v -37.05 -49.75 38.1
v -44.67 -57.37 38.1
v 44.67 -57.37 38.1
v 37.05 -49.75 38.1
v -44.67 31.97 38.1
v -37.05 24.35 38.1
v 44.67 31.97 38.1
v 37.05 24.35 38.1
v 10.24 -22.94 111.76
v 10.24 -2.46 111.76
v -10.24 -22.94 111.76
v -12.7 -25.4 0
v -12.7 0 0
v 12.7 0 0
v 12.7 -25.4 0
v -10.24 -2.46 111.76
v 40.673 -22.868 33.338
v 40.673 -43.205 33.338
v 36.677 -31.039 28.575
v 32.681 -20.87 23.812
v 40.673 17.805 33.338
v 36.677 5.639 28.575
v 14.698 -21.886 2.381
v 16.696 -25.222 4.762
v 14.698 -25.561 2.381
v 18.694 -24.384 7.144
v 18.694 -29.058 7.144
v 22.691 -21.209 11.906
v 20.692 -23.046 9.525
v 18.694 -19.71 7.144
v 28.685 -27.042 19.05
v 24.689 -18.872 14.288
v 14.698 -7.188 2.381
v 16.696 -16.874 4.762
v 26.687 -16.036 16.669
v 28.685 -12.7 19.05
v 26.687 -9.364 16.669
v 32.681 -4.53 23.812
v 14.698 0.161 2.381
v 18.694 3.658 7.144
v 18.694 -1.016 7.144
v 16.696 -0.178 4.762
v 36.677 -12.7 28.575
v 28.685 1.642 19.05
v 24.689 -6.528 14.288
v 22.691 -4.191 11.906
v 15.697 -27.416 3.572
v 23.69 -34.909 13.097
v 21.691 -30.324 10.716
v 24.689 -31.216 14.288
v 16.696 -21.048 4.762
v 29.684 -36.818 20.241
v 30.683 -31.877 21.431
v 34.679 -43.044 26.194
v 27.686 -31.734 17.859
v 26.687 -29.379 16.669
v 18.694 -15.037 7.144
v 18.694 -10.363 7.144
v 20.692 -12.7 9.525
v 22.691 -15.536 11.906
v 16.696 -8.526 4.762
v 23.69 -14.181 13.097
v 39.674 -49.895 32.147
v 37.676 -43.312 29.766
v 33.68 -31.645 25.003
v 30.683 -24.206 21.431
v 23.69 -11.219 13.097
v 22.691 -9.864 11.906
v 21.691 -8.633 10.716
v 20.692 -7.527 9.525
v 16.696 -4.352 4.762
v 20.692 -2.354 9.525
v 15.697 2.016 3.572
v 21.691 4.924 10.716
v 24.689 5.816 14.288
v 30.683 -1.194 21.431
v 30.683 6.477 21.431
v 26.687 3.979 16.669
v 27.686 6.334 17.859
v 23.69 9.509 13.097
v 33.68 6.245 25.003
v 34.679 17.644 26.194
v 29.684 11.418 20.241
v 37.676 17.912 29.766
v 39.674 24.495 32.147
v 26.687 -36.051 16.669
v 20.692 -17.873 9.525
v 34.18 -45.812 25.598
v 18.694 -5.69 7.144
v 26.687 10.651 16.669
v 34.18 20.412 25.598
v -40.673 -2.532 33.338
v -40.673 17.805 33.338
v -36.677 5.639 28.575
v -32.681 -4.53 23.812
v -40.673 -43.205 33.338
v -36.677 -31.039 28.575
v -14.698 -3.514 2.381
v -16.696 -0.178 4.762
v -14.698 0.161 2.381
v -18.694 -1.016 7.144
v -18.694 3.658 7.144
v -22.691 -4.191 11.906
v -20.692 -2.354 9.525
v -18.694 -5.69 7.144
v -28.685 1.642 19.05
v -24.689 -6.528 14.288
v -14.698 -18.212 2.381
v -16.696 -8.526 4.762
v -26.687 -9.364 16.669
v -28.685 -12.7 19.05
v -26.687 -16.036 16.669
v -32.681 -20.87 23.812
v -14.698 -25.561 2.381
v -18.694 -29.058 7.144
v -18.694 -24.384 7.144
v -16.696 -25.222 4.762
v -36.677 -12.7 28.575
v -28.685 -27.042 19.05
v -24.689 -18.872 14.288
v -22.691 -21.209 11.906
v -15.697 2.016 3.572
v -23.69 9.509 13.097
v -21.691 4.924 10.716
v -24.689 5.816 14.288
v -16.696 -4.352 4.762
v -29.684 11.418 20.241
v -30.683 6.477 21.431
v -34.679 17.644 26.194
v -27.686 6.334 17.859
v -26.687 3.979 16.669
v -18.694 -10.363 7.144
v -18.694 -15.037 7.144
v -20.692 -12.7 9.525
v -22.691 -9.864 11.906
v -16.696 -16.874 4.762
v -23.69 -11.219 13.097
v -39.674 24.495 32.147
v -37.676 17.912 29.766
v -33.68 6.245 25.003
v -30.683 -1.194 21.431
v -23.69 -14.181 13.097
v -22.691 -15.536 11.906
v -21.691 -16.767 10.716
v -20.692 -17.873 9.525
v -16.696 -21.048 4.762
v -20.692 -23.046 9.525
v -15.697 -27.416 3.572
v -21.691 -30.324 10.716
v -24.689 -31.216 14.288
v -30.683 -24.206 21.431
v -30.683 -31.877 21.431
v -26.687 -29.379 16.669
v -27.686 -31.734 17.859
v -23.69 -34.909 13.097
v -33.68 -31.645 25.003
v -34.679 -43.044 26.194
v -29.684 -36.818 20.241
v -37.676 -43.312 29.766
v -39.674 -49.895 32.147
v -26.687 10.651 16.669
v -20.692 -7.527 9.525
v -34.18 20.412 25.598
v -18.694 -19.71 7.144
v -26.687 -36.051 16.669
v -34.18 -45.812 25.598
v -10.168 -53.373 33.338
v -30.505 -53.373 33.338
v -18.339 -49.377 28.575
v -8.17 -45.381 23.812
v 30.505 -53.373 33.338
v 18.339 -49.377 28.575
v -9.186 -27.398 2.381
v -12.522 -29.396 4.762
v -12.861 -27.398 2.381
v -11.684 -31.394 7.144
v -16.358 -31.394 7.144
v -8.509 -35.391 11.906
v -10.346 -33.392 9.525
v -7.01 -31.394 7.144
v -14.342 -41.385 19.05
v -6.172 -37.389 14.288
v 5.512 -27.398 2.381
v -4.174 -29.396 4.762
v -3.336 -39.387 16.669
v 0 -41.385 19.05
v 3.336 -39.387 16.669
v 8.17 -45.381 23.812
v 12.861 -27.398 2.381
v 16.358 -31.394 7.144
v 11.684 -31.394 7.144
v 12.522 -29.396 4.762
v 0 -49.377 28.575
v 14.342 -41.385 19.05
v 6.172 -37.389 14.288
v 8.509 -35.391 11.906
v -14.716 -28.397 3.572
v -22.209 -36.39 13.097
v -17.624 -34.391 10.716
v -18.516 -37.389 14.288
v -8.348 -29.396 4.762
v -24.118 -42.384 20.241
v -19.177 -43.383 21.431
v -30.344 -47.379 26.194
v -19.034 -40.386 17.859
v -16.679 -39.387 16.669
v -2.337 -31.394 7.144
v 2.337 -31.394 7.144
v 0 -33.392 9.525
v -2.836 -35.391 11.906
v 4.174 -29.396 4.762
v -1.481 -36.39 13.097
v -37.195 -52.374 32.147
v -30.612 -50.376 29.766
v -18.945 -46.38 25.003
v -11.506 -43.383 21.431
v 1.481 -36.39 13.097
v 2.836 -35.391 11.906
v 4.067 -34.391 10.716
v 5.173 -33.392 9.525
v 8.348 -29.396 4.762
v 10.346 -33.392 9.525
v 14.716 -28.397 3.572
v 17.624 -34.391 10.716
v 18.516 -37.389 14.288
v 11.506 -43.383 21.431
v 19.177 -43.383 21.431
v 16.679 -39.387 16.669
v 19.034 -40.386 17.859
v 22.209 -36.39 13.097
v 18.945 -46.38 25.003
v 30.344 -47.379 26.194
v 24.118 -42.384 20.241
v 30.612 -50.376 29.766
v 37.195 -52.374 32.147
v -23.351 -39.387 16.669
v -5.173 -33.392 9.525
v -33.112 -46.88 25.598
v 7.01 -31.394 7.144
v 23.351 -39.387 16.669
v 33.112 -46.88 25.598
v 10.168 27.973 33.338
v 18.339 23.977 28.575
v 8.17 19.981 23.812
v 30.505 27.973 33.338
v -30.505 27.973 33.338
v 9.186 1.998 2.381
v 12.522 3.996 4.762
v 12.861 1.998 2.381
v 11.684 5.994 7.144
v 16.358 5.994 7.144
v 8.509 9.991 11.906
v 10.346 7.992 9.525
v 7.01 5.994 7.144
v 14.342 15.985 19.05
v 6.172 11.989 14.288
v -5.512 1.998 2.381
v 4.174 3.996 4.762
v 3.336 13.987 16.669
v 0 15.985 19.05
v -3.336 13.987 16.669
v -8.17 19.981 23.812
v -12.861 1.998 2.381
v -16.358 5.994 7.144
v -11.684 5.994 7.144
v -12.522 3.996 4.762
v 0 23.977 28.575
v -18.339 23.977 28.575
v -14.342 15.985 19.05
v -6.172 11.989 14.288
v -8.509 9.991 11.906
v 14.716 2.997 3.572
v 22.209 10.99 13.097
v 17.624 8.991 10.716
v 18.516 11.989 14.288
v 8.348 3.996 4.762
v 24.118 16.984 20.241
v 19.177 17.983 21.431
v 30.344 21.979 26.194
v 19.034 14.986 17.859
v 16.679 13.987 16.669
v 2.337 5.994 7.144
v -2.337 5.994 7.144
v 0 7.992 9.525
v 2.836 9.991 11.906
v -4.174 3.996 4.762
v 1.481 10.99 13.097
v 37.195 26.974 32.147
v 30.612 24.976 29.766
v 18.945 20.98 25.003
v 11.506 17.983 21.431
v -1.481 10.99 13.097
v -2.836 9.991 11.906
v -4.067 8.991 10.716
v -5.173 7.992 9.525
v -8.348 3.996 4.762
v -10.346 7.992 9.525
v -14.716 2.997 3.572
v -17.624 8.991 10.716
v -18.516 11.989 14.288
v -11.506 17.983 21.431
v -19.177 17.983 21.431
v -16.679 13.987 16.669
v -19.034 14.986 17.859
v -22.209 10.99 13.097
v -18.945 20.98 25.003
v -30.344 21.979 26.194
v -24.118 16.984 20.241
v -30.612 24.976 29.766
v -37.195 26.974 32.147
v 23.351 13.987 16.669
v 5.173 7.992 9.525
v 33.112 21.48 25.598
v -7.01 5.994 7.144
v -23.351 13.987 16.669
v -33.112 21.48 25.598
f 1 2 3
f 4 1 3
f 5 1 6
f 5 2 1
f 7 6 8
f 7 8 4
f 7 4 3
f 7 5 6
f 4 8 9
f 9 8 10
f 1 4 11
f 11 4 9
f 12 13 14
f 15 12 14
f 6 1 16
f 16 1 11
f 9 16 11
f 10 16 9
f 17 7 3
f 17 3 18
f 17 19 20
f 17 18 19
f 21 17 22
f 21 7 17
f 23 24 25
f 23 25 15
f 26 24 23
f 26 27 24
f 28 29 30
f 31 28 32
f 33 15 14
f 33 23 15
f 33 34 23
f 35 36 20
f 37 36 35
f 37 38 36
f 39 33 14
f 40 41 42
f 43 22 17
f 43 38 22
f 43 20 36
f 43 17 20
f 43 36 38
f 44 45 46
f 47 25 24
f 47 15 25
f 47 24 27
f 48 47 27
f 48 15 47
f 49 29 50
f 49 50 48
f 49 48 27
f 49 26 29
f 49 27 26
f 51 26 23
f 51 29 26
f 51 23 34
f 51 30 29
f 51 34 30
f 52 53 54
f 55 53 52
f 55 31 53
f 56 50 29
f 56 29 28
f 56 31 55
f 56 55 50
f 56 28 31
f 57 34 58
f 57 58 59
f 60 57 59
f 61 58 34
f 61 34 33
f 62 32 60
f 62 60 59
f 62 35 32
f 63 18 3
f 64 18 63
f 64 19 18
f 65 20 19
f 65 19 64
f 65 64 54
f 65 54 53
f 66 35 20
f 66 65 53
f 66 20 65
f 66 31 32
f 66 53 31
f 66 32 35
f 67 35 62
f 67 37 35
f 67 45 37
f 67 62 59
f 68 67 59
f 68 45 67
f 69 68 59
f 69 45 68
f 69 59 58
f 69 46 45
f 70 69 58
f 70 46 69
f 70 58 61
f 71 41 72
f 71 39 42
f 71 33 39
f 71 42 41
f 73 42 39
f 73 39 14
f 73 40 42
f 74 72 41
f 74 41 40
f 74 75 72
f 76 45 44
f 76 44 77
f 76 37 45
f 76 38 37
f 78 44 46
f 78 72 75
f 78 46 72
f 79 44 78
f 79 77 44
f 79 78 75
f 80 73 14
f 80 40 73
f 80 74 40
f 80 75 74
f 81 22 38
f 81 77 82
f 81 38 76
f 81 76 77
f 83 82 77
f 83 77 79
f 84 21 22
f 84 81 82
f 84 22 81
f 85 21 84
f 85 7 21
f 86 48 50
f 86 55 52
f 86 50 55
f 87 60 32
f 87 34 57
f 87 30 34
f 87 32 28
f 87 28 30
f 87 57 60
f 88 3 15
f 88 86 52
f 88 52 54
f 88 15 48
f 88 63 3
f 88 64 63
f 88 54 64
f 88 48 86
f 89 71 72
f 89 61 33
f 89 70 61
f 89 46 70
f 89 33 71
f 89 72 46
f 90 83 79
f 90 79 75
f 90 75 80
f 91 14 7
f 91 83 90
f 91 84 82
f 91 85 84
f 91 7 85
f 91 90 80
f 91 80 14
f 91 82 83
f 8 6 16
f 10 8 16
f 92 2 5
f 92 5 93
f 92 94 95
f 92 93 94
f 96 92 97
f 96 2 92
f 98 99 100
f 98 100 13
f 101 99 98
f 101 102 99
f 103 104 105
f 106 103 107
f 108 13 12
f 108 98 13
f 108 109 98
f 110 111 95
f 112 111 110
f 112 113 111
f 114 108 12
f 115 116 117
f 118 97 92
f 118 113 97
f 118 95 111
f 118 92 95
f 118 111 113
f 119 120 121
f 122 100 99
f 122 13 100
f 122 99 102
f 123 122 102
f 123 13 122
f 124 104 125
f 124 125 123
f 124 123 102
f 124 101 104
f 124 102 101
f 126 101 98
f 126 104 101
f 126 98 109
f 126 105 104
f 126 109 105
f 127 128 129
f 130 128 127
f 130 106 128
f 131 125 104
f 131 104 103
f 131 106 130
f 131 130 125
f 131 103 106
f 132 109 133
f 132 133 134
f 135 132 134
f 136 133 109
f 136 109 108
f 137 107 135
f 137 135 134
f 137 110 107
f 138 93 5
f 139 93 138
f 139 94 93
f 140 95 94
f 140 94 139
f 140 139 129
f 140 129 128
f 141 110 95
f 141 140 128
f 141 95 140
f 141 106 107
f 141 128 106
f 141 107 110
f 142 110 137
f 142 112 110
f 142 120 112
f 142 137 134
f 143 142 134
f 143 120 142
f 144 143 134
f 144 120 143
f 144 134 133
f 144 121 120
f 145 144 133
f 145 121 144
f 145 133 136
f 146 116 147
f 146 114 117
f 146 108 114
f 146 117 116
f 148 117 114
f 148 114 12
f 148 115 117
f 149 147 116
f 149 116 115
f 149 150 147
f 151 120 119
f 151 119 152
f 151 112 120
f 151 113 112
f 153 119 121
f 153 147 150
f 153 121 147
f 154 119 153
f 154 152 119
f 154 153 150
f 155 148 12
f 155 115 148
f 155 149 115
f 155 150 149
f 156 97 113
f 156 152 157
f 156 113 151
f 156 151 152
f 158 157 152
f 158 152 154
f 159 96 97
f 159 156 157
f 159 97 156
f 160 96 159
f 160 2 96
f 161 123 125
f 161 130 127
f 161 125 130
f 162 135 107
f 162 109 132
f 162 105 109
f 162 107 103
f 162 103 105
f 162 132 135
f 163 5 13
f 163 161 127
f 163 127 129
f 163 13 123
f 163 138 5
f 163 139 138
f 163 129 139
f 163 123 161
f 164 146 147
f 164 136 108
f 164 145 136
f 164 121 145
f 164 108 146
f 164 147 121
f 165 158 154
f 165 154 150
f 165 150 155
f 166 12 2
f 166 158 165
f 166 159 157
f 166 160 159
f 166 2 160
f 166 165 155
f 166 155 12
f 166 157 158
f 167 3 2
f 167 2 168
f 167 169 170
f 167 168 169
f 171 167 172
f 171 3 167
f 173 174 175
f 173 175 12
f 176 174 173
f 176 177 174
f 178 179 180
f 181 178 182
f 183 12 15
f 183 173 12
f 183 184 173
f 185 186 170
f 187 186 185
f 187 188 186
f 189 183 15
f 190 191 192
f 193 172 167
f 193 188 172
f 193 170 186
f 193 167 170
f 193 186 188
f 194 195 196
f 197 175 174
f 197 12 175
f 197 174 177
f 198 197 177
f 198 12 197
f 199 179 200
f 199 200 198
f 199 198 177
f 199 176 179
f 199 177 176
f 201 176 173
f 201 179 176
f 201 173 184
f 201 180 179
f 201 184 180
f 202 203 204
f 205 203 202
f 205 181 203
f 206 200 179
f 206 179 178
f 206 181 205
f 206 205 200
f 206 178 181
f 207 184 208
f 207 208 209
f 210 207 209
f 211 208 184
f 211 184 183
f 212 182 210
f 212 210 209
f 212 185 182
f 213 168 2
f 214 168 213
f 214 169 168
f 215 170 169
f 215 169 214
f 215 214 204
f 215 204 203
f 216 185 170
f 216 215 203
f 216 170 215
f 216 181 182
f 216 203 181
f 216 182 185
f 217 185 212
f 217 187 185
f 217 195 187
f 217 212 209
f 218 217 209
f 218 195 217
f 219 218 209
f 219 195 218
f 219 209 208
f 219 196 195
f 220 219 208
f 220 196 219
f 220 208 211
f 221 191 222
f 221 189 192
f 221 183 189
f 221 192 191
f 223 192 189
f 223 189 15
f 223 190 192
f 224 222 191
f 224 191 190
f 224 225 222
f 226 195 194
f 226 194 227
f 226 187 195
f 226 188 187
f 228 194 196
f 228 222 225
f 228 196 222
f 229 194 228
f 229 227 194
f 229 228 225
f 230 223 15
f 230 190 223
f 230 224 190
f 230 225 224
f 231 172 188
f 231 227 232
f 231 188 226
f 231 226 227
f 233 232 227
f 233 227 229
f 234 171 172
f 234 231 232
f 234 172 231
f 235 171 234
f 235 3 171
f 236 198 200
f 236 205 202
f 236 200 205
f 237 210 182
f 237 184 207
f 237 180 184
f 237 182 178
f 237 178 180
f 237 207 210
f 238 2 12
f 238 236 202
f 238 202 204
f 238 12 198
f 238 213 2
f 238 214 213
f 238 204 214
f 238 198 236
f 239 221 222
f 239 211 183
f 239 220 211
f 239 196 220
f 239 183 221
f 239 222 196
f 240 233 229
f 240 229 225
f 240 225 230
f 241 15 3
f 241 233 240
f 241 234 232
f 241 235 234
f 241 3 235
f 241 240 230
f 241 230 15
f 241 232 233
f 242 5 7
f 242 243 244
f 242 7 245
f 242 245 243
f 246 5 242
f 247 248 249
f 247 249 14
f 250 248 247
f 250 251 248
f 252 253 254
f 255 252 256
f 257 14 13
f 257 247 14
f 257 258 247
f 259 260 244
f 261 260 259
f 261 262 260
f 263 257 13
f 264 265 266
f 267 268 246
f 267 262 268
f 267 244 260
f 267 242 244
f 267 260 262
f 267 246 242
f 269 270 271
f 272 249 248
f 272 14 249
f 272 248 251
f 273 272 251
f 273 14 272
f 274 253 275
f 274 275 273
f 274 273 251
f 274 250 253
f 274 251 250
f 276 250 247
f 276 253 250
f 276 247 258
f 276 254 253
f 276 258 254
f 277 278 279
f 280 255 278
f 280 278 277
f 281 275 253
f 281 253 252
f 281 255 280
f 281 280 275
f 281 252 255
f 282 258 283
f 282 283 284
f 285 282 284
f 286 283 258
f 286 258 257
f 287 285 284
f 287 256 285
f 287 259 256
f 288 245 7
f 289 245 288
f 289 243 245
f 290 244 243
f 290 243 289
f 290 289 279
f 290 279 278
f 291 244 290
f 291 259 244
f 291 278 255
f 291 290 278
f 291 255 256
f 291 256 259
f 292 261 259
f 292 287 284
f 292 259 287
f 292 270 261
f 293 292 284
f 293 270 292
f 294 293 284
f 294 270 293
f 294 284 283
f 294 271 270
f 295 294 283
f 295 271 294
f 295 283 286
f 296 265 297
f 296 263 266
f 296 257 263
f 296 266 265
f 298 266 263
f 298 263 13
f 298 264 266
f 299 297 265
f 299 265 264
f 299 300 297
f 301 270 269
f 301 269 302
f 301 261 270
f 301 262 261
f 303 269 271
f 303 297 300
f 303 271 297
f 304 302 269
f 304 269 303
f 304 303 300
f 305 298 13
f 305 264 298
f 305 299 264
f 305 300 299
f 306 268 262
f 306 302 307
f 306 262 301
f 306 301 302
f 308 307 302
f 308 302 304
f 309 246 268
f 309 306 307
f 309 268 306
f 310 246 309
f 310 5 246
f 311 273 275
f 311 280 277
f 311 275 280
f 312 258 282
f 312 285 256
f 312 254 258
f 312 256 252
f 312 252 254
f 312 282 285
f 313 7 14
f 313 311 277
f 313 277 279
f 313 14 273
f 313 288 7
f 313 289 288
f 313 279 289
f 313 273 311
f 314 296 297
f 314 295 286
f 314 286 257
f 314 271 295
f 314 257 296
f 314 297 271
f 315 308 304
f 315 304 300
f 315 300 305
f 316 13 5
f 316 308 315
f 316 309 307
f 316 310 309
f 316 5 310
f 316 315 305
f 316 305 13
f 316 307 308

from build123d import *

# Parameters (mm, degrees)
F0_W     = 25.4
F0_H     = 25.4
F1_DEPTH = 38.1
F1_TAPER = -40
F2_W     = 74.0993918957
F2_H     = 74.0993918957
F3_DEPTH = 73.66
F3_TAPER = 20


with BuildPart() as f1:
    # F0 (on Top) → F1 (new body)
    with BuildSketch(Plane.XY):
        with Locations((0, -12.7)):
            Rectangle(F0_W, F0_H)
    extrude(amount=F1_DEPTH, taper=F1_TAPER)

    # F2 (on face) → F3 (join)
    with BuildSketch(Plane.XY.offset(38.1)):
        with Locations((0, -12.7)):
            Rectangle(F2_W, F2_H)
    extrude(amount=F3_DEPTH, taper=F3_TAPER)


solid = f1.part
